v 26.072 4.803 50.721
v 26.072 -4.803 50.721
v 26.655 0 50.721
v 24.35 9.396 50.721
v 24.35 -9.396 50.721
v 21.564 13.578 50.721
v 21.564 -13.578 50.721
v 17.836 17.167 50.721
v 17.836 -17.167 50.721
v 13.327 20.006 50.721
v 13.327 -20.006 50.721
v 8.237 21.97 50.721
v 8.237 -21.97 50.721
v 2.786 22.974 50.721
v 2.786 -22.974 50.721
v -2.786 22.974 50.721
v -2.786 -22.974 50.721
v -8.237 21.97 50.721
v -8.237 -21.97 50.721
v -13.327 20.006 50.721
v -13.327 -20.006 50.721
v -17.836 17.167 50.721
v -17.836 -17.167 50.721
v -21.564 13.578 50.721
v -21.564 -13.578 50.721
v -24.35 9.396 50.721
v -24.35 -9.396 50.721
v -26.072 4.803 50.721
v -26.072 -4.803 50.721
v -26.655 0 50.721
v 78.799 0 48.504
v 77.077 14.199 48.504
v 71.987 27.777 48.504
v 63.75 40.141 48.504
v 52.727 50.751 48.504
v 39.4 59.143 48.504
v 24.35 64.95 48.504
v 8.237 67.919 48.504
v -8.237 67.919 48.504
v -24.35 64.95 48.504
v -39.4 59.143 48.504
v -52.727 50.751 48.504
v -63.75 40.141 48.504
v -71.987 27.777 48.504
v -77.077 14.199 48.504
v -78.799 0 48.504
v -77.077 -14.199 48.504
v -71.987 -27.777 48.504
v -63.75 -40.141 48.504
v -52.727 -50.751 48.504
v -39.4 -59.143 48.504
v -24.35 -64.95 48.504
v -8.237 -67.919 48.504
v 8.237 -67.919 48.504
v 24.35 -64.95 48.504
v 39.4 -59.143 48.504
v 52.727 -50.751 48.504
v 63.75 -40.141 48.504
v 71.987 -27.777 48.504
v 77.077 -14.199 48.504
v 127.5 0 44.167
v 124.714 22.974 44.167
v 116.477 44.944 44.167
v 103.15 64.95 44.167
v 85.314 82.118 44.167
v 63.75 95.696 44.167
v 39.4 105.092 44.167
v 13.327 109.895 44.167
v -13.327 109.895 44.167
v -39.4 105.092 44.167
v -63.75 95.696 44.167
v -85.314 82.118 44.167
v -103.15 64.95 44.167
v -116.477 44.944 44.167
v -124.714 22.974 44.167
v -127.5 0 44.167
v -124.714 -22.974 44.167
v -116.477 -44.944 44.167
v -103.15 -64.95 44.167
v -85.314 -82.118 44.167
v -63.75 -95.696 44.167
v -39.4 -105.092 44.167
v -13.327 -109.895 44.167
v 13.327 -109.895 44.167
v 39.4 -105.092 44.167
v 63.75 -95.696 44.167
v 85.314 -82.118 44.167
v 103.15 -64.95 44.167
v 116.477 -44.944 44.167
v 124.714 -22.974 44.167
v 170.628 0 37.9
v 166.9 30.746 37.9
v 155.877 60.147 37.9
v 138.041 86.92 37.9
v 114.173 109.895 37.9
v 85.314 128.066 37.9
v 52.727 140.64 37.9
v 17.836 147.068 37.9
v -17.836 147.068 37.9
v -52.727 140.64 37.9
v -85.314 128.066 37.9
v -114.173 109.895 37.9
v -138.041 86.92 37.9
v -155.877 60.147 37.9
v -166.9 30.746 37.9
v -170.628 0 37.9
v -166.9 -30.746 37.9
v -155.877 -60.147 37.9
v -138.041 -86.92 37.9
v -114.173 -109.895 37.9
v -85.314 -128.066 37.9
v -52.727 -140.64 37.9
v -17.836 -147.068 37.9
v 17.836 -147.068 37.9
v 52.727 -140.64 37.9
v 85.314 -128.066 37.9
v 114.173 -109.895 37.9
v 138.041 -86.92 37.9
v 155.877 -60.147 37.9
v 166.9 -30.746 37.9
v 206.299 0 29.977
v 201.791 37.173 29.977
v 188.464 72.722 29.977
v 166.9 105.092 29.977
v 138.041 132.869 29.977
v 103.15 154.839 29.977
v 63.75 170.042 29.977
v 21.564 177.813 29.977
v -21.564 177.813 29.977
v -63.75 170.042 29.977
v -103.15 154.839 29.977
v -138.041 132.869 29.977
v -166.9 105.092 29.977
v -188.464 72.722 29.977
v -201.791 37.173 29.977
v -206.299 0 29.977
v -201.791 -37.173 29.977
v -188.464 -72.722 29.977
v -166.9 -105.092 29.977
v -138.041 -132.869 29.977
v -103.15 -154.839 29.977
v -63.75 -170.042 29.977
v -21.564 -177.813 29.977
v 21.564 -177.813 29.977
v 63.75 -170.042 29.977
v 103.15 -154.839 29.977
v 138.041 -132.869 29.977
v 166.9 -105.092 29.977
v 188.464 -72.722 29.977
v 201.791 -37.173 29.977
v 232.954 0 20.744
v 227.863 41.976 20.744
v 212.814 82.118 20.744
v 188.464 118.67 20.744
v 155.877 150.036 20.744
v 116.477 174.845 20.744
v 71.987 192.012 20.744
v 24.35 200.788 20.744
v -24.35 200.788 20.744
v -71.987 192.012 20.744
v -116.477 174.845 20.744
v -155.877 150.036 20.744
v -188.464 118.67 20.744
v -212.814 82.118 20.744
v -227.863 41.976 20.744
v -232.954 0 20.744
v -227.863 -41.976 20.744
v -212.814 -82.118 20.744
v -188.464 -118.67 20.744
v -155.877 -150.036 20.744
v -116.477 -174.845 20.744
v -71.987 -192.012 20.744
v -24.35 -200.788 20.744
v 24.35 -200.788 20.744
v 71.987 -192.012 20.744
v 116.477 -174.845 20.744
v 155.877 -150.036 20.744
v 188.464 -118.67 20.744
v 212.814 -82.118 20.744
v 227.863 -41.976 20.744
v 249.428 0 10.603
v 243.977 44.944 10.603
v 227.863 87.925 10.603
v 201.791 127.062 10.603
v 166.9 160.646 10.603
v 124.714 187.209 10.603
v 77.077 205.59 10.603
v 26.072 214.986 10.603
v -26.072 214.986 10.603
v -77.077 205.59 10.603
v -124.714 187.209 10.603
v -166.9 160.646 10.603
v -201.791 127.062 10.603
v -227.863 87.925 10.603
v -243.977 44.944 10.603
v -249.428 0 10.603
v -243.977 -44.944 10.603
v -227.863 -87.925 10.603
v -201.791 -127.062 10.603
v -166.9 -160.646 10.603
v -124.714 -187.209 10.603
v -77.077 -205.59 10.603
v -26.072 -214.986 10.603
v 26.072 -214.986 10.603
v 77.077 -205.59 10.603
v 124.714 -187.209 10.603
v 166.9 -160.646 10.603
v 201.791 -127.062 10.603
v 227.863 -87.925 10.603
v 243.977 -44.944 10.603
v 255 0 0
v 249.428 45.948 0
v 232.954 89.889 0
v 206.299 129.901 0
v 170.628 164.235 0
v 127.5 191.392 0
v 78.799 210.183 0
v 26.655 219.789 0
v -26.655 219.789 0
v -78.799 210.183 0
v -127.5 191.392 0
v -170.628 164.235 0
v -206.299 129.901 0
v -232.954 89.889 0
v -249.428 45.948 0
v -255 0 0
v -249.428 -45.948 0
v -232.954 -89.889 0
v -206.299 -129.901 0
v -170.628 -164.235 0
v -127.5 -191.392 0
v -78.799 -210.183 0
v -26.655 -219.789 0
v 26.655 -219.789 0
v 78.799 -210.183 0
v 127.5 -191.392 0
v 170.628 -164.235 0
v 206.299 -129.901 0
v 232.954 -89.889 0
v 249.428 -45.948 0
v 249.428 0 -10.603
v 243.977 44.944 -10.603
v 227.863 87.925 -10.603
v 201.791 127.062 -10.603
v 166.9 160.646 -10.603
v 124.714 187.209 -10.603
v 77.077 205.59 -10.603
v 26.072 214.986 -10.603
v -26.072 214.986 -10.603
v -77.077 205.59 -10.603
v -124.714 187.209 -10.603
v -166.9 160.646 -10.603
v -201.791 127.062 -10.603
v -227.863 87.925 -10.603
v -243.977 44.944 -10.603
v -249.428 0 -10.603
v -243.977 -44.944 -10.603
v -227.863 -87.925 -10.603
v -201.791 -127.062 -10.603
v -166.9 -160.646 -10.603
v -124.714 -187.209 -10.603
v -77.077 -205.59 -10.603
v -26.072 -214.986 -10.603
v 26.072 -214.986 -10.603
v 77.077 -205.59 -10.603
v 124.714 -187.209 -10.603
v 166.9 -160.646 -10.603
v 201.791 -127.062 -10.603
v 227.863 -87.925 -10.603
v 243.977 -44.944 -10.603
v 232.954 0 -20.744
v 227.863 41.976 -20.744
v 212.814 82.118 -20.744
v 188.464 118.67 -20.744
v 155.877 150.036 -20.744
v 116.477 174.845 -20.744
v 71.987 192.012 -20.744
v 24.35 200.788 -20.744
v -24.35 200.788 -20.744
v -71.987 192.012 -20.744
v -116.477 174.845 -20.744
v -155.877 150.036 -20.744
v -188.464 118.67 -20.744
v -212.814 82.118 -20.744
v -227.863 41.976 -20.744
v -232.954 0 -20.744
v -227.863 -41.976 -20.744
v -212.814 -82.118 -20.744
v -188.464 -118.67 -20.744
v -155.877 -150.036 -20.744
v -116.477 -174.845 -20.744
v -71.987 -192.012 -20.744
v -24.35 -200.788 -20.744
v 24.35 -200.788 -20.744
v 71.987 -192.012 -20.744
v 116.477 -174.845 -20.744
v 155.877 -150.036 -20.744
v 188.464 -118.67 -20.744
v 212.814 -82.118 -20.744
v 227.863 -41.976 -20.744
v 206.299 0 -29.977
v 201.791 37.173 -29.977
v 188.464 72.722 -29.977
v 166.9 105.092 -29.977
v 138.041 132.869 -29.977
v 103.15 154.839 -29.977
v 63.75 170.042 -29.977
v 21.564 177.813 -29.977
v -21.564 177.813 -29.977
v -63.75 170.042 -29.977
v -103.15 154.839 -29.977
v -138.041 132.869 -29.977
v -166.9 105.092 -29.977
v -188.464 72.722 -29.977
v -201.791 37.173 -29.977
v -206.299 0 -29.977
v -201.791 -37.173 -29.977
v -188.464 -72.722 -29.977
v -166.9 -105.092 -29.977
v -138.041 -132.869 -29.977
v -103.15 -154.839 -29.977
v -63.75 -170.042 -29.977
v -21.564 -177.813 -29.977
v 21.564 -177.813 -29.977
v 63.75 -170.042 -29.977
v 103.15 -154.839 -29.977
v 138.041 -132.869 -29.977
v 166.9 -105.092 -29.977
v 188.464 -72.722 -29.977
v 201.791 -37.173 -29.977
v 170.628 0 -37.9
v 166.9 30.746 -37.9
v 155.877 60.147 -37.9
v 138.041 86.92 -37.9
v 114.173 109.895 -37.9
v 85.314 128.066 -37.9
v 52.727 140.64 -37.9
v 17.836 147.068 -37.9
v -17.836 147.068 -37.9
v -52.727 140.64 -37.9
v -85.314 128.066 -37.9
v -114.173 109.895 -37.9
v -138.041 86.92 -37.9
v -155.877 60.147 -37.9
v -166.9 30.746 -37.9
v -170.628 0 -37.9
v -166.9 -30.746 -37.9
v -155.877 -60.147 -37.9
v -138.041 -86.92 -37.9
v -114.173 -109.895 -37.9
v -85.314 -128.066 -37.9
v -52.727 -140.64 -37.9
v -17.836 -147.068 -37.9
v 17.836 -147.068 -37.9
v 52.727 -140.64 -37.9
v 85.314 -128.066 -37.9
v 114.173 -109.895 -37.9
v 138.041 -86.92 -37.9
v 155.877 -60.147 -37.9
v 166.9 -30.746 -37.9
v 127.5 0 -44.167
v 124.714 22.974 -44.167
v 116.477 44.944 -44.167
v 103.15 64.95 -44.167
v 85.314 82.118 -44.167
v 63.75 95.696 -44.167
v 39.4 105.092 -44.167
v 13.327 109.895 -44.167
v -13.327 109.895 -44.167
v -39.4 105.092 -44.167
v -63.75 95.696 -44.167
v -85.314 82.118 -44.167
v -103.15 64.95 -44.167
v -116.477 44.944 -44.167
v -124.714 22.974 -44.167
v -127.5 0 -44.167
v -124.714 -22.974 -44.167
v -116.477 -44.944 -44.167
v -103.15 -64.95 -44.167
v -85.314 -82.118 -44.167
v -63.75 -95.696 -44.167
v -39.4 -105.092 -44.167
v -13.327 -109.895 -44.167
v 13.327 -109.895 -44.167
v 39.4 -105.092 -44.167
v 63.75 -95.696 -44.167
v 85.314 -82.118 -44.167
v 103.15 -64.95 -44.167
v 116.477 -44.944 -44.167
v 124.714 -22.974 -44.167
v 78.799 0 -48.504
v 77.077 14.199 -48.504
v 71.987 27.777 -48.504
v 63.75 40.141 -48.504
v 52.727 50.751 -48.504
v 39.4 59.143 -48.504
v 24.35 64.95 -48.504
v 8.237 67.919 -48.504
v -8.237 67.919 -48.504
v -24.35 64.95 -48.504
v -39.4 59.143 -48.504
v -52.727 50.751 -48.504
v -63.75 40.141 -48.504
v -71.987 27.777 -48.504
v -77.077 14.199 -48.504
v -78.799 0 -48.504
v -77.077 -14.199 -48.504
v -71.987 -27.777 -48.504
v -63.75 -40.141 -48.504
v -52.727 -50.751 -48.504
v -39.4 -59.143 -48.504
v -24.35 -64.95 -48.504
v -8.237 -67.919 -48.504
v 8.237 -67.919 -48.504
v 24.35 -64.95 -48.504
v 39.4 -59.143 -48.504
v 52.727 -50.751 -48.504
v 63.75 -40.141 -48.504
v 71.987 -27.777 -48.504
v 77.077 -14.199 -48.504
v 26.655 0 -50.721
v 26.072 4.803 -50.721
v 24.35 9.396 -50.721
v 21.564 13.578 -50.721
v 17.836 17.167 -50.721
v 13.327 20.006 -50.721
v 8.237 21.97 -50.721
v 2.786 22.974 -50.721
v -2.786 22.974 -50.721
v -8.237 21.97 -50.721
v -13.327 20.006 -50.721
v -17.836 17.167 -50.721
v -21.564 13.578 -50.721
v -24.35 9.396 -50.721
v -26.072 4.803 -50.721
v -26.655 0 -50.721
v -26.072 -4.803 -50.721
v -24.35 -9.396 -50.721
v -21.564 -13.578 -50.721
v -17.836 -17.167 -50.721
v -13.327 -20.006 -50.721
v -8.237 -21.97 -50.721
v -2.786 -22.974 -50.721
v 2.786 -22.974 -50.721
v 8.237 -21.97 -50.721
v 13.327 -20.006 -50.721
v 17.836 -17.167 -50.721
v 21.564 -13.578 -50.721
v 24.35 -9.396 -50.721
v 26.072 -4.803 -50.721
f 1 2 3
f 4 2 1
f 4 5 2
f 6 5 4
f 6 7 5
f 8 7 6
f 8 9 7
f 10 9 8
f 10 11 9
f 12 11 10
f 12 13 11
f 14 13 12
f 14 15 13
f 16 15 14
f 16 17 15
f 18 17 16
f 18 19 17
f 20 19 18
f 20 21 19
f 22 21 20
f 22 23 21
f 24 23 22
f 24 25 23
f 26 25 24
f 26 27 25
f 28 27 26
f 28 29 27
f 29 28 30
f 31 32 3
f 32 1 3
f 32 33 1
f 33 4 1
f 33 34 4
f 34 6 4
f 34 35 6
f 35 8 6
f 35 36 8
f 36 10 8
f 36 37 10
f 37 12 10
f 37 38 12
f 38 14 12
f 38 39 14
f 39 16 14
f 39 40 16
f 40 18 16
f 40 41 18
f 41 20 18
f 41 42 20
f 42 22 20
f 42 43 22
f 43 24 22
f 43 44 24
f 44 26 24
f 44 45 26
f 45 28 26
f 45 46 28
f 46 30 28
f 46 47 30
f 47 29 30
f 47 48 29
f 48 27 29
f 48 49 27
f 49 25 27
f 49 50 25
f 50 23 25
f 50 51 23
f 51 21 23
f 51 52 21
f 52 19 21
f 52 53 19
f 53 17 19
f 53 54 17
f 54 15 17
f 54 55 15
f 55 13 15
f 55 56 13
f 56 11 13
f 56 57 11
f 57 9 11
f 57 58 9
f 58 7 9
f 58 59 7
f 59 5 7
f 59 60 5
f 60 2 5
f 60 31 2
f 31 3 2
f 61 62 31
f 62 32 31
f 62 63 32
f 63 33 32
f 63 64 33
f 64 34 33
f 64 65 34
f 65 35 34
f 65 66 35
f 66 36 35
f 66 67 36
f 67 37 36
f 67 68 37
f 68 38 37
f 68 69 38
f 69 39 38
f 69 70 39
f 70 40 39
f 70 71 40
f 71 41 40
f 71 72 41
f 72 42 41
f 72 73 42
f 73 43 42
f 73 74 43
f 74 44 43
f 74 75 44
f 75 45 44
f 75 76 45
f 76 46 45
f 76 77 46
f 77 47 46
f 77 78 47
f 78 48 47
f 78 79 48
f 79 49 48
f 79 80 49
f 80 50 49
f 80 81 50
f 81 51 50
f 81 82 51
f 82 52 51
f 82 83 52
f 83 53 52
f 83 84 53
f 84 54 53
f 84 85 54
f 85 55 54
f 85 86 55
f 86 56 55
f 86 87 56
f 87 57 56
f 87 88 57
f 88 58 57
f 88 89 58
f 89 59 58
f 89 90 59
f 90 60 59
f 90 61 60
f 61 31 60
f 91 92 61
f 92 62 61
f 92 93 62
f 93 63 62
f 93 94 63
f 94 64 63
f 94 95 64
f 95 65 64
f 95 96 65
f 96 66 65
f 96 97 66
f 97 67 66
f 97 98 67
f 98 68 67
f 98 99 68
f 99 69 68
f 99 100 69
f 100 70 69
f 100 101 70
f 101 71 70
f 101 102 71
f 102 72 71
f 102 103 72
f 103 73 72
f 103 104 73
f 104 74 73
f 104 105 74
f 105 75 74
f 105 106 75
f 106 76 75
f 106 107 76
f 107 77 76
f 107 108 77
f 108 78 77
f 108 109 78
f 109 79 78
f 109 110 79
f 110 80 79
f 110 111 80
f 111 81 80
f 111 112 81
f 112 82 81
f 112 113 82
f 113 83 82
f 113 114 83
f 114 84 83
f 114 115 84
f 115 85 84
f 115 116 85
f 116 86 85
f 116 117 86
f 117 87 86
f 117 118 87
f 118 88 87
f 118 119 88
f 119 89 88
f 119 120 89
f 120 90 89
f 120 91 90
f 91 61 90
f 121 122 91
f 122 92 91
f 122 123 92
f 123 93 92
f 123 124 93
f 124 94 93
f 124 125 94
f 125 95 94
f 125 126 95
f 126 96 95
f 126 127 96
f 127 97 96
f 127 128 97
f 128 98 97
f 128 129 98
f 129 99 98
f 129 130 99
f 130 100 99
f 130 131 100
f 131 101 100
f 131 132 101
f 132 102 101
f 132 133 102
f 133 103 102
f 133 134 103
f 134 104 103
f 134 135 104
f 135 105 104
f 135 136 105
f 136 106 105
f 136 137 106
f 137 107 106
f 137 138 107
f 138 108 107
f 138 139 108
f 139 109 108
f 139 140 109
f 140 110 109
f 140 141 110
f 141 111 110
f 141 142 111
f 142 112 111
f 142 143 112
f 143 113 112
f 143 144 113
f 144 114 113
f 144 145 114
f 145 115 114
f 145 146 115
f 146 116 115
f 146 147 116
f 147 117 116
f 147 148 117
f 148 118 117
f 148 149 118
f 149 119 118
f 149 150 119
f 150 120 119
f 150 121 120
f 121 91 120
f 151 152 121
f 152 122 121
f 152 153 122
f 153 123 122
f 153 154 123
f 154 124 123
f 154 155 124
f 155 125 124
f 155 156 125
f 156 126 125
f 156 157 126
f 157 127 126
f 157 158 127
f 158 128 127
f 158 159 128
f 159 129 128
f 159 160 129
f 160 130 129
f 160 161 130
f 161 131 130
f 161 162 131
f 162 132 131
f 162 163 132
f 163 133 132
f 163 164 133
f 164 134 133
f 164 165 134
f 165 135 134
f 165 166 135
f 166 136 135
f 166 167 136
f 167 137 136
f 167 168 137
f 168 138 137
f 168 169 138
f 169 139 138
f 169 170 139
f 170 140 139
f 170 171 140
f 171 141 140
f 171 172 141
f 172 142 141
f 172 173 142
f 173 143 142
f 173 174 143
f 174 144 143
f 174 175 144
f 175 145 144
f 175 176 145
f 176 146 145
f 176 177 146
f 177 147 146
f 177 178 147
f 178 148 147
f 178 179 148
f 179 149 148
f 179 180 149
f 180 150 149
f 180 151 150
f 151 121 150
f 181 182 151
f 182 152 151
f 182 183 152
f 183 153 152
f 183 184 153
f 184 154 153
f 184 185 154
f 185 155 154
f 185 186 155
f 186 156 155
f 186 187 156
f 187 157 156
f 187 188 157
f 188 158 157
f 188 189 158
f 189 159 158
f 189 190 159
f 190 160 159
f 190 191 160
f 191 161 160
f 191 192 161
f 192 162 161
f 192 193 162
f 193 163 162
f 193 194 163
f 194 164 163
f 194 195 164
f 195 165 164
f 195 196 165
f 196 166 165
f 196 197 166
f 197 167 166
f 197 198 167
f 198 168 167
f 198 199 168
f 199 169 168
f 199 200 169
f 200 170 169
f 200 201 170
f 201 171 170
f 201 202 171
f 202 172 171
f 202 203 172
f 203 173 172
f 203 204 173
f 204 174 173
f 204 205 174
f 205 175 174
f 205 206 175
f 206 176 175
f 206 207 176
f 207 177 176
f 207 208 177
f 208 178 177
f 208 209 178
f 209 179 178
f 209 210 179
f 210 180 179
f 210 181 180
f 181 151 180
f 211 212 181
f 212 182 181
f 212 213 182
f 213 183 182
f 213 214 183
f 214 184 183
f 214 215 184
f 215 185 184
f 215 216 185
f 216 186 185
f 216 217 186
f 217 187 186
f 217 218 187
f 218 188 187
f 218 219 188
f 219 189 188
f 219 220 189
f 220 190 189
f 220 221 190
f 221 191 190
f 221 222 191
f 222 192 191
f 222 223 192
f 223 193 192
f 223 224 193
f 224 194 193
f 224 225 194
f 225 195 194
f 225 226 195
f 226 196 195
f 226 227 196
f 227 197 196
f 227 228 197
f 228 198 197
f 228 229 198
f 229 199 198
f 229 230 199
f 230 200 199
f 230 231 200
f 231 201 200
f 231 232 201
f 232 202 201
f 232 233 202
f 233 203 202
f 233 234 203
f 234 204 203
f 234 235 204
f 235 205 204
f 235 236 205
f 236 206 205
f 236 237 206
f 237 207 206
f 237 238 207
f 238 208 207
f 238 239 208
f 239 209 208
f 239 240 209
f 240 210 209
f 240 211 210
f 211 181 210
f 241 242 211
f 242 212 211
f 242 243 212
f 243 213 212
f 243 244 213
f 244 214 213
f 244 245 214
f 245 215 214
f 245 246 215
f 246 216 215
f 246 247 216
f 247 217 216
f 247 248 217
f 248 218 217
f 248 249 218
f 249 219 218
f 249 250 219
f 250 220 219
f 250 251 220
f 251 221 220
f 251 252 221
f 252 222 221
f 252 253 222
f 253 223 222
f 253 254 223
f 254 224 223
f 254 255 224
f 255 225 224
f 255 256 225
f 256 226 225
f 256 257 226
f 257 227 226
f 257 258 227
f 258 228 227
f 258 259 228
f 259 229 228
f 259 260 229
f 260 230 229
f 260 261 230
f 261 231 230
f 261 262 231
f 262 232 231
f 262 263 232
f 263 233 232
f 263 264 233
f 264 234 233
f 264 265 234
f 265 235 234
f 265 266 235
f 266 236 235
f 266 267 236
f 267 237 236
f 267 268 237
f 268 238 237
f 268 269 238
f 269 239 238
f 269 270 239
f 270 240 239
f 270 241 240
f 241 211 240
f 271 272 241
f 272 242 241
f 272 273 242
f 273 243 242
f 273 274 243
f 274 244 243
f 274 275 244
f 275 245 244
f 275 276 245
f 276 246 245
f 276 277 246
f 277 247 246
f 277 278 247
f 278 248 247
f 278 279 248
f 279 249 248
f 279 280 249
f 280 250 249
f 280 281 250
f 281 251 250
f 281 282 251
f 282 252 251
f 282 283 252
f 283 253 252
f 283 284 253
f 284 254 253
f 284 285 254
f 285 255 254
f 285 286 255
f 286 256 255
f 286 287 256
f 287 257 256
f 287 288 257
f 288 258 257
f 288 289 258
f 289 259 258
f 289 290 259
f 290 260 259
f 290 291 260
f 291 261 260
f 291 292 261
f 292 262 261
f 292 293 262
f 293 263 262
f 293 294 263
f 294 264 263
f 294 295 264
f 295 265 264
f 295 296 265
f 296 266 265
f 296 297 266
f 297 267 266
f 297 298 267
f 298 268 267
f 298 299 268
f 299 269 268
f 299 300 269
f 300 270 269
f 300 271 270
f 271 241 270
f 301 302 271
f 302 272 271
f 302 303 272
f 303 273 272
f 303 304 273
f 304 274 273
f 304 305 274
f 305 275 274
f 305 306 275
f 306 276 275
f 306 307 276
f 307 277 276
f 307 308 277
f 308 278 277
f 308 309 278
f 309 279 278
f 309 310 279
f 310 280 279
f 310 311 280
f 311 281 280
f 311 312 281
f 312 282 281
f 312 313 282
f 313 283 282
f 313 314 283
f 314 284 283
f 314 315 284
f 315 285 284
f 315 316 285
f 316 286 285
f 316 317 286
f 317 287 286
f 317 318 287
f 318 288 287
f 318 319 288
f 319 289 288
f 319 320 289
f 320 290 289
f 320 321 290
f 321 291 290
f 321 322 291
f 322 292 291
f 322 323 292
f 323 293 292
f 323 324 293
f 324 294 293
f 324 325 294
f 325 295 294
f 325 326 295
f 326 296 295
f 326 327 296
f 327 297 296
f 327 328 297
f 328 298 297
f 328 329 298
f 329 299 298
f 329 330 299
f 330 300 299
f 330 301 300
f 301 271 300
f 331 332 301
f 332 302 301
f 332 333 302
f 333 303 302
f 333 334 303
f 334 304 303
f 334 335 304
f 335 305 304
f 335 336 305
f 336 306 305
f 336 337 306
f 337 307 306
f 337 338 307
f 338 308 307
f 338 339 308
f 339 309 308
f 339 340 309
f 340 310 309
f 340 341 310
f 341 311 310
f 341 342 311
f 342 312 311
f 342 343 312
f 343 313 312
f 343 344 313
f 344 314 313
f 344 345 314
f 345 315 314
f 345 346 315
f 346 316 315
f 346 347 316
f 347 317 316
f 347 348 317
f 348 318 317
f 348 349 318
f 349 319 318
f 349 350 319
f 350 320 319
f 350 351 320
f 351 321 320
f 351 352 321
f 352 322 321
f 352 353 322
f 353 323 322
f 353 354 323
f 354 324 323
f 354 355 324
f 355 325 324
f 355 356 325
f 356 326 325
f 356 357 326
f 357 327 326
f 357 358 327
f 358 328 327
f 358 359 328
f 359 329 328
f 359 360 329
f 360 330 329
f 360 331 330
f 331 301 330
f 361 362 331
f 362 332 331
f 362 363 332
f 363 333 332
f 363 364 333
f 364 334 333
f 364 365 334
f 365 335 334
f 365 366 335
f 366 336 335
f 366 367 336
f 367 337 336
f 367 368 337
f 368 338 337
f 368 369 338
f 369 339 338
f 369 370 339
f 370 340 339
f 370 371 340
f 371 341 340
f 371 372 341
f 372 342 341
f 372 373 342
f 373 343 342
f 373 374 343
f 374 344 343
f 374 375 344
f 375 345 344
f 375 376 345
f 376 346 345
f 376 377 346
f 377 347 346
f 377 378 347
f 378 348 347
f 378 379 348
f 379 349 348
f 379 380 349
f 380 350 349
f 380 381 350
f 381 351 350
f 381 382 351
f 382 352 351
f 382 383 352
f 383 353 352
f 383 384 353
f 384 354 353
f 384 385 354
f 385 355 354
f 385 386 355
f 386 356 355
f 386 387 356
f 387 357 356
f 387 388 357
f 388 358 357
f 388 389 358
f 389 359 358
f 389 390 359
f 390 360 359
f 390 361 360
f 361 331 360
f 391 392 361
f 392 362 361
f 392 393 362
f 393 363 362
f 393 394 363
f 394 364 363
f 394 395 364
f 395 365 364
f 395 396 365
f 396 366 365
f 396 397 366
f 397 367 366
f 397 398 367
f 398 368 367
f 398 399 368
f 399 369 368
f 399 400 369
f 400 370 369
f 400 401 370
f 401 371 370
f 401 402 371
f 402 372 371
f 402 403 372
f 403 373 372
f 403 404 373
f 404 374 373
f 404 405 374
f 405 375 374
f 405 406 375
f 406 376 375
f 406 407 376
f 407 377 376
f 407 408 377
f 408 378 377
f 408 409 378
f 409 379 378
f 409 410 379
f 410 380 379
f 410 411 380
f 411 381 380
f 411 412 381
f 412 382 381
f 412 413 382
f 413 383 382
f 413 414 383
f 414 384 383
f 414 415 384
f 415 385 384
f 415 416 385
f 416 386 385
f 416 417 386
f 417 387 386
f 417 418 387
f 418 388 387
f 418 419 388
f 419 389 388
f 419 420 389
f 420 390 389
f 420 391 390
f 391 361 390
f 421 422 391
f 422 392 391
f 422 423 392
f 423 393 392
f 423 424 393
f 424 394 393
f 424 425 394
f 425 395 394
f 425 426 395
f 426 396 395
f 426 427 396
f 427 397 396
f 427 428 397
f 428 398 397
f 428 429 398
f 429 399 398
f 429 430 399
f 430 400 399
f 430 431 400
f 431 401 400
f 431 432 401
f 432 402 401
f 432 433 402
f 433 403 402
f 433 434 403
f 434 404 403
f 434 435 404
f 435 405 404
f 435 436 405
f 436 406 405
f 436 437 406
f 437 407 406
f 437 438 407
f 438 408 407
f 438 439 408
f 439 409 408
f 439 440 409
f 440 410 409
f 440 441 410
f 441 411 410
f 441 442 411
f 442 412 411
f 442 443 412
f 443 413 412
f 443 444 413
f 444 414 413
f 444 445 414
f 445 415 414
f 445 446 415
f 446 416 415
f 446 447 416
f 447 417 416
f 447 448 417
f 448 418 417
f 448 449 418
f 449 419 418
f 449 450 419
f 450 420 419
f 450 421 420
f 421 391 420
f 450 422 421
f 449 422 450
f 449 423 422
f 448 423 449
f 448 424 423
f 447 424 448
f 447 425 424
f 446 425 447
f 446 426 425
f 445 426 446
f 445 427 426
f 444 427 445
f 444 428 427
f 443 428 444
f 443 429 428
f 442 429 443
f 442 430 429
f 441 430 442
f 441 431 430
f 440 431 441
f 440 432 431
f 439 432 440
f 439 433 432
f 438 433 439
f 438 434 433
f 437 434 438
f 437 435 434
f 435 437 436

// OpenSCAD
// Generated by SolidPython 1.0.1 on 2020-07-29 00:46:52


scale(v = [15, 13, 3]) {
	sphere(r = 17);
}
/***********************************************
*********      SolidPython code:      **********
************************************************
 
# import packages: SolidPython
from solid import *
from solid.utils import *
from itertools import chain, combinations, permutations


class Resize:

    def __init__(self, scad_file):
        self.scad_file = scad_file
        #self.scad_file = import_scad(scad_file)
        # cone/cylinder param:
        self.r1 = 0
        self.r2 = 0
        self.h = 0
        # rectangular prism param:
        self.w = 0
        self.l = 0
        # ellipse param:
        self.r = 0

    # import OpenScad code (file name corresponds to shape)


    # classify shape + parameters
    def assign(self, param1, param2, param3):
        if self.scad_file == 'cone.scad':
            self.r1 = param1
            self.r2 = param2
            self.h = param3
        elif self.scad_file == 'cylinder.scad':
            self.r1 = param1
            self.r2 = param2
            self.h = param3
        elif self.scad_file == 'rectangularPrism.scad':
            self.h = param1
            self.l = param2
            self.w = param3
        else:
            self.r = param1
            self.h = param2

    # resize parameters
    def iterate(self):
        x = range(3, 20, 2)
        i = 1
        if self.scad_file == 'cone.scad':
            tempList = list(permutations(x, 2))
            for temp in tempList:
                param1 = temp[0]
                param2 = temp[1]
                filepath = 'produced_scad_files/' + 'cone' + str(param1) + '_' + str(param2) + '_' + '.scad'
                scad_render_to_file(cylinder(h=param1, r1=param2, r2=0), filepath)

        elif self.scad_file == 'cylinder.scad':
            tempList = list(permutations(x, 3))
            for temp in tempList:
                param1 = temp[0]
                param2 = temp[1]
                filepath = 'produced_scad_files/' + 'cylinder' + str(param1) + '_' + str(param2) + '_' + '.scad'
                scad_render_to_file(cylinder(h=param1, r1=param2, r2=param2), filepath)

        elif self.scad_file == 'rectangularPrism.scad':
            tempList = list(permutations(x, 3))
            for temp in tempList:
                param1 = temp[0]
                param2 = temp[1]
                param3 = temp[2]
                filepath = 'produced_scad_files/' + 'rectangularPrism' + str(param1) + '_' + str(param2) + '_' + str(
                    param3) + '.scad'
                scad_render_to_file(cube(size=(param1, param2, param3)), filepath)

        elif self.scad_file == 'ellipse.scad':
            tempList = list(permutations(x, 4))
            for temp in tempList:
                param1 = temp[0]
                param2 = temp[1]
                param3 = temp[2]
                param4 = temp[3]
                filepath = 'produced_scad_files/' + 'ellipse' + str(param1) + '_' + str(param2) + '_' + str(param3) + '_' + str(param4) + '.scad'
                scad_render_to_file(scale([param1, param2, param3])(sphere(r=param4)), filepath)

    def render_to_scadfile(self):
        scad_render_to_file(scad, 'example.scad') 
 
************************************************/
